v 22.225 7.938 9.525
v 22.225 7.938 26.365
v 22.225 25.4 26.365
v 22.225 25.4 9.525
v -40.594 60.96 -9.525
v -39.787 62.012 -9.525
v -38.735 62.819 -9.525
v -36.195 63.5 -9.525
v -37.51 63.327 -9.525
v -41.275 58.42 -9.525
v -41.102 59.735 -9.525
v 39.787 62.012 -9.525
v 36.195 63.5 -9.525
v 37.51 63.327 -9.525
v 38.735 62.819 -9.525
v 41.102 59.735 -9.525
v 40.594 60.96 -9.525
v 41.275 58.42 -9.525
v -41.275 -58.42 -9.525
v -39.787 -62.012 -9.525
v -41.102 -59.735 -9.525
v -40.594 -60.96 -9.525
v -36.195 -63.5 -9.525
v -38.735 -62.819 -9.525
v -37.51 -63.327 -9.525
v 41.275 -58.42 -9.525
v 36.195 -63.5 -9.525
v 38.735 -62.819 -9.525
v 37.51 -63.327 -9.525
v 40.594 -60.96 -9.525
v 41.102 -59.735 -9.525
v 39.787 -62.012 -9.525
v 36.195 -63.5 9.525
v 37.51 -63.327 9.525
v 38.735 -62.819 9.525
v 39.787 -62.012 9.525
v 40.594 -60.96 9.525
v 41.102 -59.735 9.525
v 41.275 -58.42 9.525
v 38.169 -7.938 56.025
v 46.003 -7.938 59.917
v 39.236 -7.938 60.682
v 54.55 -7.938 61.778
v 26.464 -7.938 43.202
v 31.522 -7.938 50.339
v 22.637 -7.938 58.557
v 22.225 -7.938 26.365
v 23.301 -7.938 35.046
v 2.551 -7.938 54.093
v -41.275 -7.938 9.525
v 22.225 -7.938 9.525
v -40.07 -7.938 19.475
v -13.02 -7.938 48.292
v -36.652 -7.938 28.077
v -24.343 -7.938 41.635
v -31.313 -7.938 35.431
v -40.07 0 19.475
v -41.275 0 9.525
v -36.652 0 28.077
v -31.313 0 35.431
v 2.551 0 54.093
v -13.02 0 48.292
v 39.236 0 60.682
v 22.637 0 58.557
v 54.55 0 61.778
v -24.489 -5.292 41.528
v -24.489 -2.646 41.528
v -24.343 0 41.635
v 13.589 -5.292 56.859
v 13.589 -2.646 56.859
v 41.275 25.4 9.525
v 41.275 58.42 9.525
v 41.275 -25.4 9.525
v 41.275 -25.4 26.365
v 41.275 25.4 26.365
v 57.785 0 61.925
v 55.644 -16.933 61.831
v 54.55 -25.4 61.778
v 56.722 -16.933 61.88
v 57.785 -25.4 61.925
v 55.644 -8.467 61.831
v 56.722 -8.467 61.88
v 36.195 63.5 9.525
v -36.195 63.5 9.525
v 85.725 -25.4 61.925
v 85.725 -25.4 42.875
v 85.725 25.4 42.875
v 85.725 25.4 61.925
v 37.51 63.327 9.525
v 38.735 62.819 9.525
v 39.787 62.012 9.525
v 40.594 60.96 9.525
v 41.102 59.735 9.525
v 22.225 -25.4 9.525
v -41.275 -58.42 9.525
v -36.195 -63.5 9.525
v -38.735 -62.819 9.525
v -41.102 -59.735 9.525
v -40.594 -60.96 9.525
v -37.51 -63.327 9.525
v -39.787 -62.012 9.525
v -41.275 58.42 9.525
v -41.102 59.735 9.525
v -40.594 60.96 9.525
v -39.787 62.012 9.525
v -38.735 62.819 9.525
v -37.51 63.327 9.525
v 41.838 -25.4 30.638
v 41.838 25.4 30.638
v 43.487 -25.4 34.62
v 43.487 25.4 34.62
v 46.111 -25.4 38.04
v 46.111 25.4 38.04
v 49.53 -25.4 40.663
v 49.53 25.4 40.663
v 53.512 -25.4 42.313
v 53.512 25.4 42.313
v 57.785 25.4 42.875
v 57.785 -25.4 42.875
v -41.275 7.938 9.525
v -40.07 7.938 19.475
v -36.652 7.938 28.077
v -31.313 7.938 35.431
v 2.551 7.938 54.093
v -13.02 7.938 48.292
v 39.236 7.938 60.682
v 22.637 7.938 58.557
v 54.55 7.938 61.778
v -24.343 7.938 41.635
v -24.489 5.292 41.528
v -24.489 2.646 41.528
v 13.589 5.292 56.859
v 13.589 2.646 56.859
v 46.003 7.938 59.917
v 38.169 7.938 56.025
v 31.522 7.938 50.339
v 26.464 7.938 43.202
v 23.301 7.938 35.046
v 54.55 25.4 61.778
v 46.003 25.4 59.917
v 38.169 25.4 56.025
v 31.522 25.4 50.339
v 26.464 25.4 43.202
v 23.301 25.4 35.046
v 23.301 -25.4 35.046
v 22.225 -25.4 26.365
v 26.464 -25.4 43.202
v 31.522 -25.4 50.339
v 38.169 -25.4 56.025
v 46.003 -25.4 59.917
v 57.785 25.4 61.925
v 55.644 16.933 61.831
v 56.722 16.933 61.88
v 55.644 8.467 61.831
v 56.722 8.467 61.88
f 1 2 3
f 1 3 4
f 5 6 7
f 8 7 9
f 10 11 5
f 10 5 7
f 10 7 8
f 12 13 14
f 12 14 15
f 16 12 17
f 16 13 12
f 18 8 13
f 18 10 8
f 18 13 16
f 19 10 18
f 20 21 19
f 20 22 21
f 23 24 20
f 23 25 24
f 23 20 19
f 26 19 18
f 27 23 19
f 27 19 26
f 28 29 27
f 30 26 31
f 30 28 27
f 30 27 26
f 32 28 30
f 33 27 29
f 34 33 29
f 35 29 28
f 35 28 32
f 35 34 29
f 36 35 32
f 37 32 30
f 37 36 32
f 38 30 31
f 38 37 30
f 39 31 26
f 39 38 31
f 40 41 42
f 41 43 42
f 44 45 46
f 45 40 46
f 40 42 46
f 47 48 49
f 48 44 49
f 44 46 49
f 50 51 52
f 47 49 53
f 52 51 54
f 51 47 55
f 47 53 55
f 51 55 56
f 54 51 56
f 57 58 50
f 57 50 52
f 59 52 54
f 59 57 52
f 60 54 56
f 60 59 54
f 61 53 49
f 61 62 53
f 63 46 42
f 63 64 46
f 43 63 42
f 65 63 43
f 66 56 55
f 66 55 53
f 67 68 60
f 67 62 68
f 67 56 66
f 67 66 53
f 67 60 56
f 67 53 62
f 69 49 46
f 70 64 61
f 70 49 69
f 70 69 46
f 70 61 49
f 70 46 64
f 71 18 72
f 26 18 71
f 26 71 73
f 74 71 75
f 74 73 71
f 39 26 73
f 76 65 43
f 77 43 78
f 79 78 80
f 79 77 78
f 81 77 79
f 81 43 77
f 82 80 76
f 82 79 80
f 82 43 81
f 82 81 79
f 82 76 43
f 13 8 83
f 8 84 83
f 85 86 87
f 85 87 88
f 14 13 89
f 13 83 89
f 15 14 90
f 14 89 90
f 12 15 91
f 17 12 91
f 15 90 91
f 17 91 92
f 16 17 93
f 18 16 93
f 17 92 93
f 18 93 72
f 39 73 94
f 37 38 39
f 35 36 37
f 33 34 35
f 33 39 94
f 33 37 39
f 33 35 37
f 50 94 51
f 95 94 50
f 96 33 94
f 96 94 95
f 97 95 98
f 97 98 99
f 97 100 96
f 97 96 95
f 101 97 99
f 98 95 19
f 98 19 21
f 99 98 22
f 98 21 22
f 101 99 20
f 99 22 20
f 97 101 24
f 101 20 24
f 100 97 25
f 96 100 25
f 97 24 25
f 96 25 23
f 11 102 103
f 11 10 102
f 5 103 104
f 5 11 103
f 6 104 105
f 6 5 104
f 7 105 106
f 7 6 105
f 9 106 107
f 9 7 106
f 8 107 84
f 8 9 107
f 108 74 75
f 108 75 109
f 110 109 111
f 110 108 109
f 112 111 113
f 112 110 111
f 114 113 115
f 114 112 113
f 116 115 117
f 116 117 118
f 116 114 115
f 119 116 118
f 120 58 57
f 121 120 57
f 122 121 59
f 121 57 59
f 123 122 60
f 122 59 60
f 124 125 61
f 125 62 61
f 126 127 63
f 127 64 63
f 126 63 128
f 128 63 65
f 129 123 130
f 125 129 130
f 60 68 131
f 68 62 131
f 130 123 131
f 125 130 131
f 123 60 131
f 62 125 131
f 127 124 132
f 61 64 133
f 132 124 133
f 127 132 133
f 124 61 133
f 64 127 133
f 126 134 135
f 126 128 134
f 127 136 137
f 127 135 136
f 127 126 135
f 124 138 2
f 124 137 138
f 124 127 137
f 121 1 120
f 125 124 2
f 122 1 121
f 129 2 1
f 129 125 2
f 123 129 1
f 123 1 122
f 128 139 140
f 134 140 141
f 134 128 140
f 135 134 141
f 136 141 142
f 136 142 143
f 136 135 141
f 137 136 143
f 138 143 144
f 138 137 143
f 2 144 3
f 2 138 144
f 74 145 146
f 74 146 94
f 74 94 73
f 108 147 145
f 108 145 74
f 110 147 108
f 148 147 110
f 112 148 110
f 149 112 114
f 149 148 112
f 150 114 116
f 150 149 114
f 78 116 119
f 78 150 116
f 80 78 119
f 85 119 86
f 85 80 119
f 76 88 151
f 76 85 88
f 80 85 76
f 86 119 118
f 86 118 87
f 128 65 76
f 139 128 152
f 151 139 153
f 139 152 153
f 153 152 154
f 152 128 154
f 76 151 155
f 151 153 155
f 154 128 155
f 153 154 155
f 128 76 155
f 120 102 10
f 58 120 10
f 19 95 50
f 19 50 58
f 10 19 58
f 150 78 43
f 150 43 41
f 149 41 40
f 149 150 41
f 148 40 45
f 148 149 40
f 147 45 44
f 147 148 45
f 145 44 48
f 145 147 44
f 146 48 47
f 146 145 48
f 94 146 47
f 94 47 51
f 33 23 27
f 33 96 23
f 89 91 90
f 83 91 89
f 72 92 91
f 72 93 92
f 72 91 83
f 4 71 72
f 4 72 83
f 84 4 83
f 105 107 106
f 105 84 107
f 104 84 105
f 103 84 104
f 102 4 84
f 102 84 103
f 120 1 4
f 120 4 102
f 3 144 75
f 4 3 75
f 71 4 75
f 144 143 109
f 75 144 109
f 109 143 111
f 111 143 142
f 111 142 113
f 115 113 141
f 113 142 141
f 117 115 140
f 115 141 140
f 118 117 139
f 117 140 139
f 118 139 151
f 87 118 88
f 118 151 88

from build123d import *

# Parameters (mm, degrees)
F1_DEPTH = 63.5
F0_W     = 24.512149
F0_H     = 19.05
F2_DEPTH = 25.4
F3_DEPTH = 7.9375
F4_R     = 5.08


with BuildPart() as f1:
    # F0 (on Front) → F1 (new body, symmetric)
    with BuildSketch(Plane.XZ):
        Polygon((22.225, 9.525), (-41.275, 9.525), (-41.275, -9.525), (41.275, -9.525), (41.275, 9.525), align=None)
    extrude(amount=F1_DEPTH, both=True)

    # F0 (on Front) → F2 (join, symmetric)
    with BuildSketch(Plane.XZ):
        with BuildLine():
            Line((22.225, 26.3652), (22.225, 9.525))
            Line((22.225, 9.525), (41.275, 9.525))
            Line((41.275, 9.525), (41.275, 26.3652))
            ThreePointArc((41.275, 26.3652), (46.110667, 38.039533), (57.785, 42.8752))
            Line((57.785, 42.8752), (61.212851, 42.8752))
            Line((61.212851, 42.8752), (61.212851, 61.9252))
            Line((61.212851, 61.9252), (57.785, 61.9252))
            add(Edge.make_bspline(
                [(54.550323, 61.777775), (55.650758, 61.832388), (56.729755, 61.881267), (57.785, 61.9252)],
                knots=[108.765269, 108.765269, 108.765269, 108.765269, 112.065448, 112.065448, 112.065448, 112.065448], degree=3))
            ThreePointArc((54.550323, 61.777775), (31.521539, 50.339024), (22.225, 26.3652))
        make_face()
        with Locations((73.468925, 52.4002)):
            Rectangle(F0_W, F0_H)
    extrude(amount=F2_DEPTH, both=True)

    # F0 (on Front) → F3 (join, symmetric)
    with BuildSketch(Plane.XZ):
        with BuildLine():
            add(Edge.make_bspline(
                [(-41.275, 9.525), (-41.271032, 51.950031), (18.282835, 59.977869), (54.550323, 61.777775)],
                knots=[0, 0, 0, 0, 108.765269, 108.765269, 108.765269, 108.765269], degree=3))
            Line((-41.275, 9.525), (22.225, 9.525))
            Line((22.225, 9.525), (22.225, 26.3652))
            ThreePointArc((22.225, 26.3652), (31.521539, 50.339024), (54.550323, 61.777775))
        make_face()
    extrude(amount=F3_DEPTH, both=True)

    # F4
    f4_edges = [f1.edges().sort_by_distance(p)[0] for p in [
        (41.275, -63.5, 0),
        (41.275, 63.5, 0),
        (-41.275, -63.5, 0),
        (-41.275, 63.5, 0),
    ]]
    fillet(f4_edges, radius=F4_R)


solid = f1.part
